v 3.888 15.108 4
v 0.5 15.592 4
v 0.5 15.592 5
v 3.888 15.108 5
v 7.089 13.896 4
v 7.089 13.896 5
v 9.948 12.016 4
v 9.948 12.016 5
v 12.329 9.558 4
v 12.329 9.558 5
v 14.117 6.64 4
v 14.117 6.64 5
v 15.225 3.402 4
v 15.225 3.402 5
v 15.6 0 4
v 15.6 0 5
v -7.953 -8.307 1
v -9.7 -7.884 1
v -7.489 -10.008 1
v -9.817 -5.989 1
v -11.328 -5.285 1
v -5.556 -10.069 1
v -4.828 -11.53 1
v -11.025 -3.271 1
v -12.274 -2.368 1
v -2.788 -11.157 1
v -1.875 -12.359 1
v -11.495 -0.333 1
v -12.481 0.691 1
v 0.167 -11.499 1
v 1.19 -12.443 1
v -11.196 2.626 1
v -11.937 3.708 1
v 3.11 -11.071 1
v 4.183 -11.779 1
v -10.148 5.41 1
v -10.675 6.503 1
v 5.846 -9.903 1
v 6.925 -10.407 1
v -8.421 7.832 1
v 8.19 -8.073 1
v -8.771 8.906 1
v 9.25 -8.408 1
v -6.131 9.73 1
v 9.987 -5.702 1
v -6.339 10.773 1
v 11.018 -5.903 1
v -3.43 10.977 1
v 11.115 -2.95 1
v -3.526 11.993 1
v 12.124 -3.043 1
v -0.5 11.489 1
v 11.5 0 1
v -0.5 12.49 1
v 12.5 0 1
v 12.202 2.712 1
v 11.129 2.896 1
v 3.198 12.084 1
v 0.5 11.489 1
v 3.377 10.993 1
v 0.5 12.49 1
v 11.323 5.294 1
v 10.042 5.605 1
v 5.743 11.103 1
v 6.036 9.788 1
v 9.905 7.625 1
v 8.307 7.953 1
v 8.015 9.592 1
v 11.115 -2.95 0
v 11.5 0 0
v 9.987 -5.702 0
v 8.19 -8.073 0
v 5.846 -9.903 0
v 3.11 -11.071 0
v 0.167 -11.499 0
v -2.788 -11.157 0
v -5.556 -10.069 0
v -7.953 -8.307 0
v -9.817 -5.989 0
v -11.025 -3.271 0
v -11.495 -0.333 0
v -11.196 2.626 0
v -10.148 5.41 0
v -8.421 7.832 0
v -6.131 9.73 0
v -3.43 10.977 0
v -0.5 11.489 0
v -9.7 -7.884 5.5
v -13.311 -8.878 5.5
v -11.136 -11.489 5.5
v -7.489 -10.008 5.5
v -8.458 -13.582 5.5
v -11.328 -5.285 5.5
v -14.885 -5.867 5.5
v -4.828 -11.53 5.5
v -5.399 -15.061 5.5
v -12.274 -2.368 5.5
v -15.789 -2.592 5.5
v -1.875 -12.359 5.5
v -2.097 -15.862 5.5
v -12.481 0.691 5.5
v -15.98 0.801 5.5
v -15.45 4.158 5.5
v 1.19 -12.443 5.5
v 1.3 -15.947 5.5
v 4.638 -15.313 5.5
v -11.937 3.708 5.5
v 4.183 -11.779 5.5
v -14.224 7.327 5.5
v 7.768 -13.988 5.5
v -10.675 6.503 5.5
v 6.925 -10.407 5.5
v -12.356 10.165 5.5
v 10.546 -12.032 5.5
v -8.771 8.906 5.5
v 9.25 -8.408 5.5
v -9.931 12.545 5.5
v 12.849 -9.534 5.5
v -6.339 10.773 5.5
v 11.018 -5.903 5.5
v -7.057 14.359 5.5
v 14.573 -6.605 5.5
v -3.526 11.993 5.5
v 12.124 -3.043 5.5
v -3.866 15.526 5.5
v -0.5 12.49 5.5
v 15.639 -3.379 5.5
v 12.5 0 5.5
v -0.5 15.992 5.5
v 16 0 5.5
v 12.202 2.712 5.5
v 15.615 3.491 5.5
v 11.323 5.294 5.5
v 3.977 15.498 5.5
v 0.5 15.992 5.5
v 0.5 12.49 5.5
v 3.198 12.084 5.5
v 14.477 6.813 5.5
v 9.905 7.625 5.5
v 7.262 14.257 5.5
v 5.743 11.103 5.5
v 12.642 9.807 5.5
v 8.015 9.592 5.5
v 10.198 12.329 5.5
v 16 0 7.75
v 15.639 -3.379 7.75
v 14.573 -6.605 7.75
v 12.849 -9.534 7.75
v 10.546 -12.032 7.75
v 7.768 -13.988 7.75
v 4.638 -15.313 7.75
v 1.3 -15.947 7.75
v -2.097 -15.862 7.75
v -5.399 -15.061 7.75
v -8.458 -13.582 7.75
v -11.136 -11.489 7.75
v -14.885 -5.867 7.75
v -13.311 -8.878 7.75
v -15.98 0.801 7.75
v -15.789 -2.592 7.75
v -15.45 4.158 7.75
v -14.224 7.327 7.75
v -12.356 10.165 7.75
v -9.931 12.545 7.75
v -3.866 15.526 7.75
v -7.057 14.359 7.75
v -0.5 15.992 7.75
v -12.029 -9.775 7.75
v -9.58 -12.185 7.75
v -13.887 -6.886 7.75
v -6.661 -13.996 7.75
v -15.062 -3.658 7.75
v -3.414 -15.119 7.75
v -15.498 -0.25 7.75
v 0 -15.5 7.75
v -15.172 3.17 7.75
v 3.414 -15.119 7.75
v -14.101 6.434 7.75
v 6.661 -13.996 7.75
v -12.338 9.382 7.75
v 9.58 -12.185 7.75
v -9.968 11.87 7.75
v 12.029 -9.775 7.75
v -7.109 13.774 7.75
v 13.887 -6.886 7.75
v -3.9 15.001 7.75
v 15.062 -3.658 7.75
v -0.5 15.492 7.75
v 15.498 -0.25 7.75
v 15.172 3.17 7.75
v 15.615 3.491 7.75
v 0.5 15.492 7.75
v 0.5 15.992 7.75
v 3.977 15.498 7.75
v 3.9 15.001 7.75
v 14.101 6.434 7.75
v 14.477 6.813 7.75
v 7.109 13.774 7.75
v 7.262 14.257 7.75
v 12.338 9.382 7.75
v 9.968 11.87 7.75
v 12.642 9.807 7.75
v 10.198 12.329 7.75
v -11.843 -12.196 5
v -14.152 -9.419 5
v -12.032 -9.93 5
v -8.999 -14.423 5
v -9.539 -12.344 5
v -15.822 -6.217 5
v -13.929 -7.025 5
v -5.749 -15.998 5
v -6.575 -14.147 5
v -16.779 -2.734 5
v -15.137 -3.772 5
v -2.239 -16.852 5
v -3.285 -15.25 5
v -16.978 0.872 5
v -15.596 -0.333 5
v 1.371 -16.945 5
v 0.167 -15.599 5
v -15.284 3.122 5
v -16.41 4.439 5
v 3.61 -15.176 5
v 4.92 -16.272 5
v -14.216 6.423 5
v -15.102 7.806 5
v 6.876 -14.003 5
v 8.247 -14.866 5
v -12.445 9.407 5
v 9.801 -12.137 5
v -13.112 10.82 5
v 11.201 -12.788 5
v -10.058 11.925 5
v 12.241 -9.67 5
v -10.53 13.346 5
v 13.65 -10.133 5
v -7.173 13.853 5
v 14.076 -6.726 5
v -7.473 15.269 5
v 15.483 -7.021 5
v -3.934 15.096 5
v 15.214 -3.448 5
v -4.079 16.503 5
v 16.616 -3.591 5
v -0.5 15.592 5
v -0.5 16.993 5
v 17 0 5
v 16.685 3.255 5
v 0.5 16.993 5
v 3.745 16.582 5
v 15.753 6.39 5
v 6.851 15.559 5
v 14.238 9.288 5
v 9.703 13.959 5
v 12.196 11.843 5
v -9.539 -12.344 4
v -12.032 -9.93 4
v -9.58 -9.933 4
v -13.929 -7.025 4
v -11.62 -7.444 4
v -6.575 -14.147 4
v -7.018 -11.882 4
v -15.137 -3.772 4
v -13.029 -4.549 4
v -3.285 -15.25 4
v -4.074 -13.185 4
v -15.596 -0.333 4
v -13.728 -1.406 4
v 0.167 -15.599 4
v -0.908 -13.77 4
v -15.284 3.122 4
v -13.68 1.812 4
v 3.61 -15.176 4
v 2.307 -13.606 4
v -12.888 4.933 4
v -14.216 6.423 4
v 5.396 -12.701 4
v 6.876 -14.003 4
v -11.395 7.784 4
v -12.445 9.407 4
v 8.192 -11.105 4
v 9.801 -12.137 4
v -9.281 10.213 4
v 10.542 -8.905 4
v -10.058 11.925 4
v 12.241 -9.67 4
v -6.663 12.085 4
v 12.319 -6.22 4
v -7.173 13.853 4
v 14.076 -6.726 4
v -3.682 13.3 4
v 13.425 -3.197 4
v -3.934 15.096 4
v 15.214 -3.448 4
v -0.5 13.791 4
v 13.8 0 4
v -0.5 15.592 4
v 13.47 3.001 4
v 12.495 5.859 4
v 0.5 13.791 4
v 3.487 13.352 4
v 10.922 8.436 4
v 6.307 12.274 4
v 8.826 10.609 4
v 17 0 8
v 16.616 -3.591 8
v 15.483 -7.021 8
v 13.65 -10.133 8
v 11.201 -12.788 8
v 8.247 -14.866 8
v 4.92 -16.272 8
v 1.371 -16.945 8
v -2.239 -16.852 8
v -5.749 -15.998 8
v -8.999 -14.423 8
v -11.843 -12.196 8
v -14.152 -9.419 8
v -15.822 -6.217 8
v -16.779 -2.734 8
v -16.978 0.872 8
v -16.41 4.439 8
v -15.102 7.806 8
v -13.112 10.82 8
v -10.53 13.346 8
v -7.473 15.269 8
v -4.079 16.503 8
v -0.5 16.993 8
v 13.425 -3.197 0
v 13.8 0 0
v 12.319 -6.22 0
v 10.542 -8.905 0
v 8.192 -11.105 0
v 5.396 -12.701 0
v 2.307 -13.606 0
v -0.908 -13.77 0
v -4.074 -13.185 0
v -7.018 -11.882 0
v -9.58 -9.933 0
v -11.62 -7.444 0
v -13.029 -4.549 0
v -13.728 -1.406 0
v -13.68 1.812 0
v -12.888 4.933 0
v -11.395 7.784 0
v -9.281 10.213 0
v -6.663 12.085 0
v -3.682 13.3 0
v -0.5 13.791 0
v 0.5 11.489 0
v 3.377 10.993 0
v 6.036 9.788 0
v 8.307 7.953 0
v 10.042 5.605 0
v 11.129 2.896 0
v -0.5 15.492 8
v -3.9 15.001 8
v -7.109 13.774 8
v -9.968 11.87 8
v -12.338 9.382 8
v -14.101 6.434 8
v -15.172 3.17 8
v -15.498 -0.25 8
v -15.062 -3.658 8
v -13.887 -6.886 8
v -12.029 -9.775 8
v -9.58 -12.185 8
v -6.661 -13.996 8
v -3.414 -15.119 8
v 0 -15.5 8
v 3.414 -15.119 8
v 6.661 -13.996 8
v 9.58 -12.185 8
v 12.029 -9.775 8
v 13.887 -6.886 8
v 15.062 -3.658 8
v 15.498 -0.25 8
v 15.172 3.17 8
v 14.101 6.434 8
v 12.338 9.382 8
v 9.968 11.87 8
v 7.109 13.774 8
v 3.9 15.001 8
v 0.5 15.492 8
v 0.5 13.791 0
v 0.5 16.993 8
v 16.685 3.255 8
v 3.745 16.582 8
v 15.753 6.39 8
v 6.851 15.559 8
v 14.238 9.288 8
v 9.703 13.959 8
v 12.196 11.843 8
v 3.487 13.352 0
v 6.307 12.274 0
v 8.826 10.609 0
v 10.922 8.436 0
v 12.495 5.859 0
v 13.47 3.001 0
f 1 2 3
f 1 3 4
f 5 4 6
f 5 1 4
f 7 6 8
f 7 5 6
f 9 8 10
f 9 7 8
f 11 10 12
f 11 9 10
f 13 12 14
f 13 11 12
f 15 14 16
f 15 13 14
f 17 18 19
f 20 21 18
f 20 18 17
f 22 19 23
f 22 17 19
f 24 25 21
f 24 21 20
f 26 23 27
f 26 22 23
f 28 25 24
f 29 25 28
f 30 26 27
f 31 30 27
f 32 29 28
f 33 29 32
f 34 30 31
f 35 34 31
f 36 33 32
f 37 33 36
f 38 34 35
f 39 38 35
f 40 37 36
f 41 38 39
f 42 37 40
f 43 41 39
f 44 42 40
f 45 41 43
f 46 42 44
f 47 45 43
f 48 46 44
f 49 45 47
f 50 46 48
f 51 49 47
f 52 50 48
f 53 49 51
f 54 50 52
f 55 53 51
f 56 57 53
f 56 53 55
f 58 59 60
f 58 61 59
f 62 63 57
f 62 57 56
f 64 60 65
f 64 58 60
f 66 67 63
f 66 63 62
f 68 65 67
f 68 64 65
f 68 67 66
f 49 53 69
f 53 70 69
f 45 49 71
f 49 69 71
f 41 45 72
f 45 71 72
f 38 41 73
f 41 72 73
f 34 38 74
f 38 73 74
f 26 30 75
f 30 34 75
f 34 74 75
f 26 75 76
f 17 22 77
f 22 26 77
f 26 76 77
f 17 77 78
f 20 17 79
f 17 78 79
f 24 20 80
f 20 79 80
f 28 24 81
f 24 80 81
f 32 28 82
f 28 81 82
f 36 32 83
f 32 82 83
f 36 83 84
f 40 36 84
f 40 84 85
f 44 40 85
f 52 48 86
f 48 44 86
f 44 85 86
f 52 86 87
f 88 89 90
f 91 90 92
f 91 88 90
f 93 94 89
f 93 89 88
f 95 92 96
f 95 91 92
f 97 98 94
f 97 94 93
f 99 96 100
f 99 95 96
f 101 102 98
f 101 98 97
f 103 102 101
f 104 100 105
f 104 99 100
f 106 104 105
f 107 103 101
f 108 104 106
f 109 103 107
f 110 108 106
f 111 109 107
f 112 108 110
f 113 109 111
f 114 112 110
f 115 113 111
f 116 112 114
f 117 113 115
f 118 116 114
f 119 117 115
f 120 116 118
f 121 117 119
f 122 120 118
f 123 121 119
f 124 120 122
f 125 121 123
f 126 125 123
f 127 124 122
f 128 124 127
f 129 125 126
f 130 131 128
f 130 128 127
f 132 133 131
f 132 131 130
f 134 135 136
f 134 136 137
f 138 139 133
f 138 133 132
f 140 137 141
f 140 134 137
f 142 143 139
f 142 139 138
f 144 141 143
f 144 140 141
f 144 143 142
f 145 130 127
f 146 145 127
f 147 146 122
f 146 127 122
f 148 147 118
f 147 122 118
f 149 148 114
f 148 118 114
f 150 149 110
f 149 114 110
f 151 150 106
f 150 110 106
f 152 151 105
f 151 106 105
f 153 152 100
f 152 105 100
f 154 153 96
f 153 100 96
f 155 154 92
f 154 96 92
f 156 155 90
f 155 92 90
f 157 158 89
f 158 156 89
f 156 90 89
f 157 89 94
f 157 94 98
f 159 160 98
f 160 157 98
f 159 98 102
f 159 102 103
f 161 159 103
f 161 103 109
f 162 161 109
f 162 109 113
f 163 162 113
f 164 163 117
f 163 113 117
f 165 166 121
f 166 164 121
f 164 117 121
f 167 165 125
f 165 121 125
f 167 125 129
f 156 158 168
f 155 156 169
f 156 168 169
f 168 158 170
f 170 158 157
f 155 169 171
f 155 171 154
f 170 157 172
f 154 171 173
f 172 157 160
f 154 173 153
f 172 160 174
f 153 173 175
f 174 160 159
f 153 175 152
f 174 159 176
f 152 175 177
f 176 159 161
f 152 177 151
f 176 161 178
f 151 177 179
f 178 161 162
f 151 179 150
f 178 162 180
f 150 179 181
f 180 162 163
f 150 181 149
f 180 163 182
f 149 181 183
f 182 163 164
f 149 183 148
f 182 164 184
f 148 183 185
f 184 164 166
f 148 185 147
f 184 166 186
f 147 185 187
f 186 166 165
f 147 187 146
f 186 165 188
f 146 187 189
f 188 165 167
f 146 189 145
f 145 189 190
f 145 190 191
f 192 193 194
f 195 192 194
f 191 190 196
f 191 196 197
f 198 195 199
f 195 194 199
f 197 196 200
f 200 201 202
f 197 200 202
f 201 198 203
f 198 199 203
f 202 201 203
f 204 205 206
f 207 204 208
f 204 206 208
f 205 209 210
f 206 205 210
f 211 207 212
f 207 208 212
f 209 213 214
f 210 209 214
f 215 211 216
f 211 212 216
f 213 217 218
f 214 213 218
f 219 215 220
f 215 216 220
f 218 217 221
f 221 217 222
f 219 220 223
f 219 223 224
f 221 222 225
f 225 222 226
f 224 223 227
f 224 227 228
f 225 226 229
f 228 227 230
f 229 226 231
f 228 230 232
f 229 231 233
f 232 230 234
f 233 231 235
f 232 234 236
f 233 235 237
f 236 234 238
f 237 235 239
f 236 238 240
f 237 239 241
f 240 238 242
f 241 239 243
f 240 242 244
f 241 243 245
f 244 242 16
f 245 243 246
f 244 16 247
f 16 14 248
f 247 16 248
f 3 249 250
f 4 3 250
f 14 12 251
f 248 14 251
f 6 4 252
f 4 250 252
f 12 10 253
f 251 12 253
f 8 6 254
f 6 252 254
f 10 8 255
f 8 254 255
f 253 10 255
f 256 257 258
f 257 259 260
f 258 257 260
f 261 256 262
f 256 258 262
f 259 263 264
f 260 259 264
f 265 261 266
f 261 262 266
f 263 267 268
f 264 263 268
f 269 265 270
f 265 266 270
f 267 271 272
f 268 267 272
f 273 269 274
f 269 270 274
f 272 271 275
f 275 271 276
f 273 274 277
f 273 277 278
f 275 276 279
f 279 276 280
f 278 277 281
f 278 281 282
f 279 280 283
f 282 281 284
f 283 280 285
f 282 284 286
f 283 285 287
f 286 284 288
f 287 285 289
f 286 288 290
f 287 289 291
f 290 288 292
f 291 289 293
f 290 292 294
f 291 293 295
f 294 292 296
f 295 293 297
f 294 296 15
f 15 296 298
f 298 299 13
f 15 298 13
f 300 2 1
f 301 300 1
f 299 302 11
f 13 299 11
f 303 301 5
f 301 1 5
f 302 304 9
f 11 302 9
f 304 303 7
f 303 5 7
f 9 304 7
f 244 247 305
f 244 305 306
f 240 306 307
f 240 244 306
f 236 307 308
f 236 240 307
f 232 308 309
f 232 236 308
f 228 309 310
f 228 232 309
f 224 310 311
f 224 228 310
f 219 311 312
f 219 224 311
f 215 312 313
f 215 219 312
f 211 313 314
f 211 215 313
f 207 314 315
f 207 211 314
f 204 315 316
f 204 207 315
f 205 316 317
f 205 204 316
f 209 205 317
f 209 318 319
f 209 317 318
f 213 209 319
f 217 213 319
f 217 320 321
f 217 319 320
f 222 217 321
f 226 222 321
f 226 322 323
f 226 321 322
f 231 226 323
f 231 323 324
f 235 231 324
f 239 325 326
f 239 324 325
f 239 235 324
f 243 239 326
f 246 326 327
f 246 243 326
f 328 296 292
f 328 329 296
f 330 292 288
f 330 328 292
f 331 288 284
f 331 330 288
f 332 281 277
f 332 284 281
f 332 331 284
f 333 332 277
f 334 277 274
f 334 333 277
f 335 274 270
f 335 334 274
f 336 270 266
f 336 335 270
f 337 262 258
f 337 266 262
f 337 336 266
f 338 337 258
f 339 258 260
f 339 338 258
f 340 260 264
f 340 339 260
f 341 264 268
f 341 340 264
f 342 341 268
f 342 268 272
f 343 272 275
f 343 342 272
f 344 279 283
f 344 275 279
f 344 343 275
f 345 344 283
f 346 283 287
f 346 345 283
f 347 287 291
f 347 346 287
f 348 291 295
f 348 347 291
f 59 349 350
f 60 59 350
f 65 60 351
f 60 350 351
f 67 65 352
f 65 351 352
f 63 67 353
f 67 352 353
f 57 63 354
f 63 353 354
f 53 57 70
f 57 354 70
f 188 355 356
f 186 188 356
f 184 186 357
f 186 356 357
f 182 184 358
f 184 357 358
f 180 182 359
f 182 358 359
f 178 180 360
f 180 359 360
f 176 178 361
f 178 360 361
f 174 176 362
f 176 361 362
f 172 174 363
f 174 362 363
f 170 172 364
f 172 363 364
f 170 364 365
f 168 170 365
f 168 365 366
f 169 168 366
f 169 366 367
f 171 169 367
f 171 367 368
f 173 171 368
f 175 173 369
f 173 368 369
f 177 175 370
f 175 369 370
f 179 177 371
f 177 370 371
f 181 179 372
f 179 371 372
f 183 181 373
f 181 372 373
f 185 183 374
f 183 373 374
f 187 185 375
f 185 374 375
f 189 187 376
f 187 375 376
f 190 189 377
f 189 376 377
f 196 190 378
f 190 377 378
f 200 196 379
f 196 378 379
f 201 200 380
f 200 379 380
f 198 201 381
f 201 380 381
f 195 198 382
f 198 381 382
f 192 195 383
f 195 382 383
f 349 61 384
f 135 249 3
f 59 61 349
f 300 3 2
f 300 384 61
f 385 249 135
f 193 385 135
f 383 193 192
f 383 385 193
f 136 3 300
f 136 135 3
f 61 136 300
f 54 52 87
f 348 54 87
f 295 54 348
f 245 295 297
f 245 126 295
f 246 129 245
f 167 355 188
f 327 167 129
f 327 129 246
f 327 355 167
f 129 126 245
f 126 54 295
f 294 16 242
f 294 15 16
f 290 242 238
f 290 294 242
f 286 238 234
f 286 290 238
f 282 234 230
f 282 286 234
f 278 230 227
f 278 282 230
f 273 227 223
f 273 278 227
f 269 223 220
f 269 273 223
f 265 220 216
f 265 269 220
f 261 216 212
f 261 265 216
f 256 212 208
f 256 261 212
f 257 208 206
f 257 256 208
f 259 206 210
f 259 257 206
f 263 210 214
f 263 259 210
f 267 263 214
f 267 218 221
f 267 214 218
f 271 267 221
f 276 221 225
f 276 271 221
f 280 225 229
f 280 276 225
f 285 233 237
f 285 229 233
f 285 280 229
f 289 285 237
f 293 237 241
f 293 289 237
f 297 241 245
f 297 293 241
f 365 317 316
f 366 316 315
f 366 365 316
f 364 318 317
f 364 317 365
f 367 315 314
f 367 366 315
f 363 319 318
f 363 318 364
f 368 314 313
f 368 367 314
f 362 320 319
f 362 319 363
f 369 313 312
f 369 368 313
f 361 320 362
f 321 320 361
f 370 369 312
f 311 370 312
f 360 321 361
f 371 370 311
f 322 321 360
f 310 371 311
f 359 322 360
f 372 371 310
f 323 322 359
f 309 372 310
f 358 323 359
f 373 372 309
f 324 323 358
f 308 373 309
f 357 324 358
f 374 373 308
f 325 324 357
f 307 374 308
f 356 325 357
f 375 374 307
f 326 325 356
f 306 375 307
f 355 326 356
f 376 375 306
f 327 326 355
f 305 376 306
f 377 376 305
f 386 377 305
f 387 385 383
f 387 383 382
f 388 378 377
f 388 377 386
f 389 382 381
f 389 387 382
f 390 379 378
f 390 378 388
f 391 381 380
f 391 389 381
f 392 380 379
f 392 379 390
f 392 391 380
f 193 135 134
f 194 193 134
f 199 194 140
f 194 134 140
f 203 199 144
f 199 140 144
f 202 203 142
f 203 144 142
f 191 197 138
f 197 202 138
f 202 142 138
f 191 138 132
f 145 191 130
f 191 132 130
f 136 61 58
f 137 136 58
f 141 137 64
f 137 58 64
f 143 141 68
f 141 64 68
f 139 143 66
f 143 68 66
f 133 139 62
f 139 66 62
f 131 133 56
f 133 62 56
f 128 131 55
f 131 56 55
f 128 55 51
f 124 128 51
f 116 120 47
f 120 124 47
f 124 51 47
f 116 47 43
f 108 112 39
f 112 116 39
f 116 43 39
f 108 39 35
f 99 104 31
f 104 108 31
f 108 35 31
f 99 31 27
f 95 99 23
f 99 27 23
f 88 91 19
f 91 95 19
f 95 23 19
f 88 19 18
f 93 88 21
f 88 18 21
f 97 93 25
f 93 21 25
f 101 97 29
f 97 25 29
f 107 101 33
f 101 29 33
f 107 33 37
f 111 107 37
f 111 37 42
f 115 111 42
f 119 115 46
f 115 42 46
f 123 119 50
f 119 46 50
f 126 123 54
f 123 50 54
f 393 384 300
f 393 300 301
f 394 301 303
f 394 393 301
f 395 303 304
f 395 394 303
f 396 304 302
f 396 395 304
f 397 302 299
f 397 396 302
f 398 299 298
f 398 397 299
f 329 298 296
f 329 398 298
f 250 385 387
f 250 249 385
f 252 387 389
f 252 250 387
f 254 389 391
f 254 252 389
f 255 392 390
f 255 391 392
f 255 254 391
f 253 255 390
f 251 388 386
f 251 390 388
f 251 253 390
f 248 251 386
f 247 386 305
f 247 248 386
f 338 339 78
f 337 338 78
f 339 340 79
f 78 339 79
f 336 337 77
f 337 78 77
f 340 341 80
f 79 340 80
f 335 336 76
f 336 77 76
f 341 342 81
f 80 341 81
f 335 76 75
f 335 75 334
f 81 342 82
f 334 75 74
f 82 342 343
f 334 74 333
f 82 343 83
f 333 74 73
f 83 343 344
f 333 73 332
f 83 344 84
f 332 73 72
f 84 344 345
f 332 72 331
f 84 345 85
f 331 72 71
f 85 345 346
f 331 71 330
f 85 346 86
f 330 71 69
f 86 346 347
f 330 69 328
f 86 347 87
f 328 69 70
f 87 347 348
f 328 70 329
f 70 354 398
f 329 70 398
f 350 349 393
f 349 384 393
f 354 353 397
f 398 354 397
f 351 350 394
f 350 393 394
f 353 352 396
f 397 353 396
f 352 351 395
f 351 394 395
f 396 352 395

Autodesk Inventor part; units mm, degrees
ref_plane "YZ Plane" through (0, 0, 0) normal (1, 0, 0) x (0, 1, 0)
ref_plane "XZ Plane" through (0, 0, 0) normal (0, 1, 0) x (-1, 0, 0)
ref_plane "XY Plane" through (0, 0, 0) normal (0, 0, 1) x (1, 0, 0)
sketch "Sketch1" plane through (0, 0, 0) normal (0, 0, 1) x (1, 0, 0)
  circle A0 centre (0, 0) radius 13.8
  circle A1 centre (0, 0) radius 11.5
  circle A2 centre (0, 0) radius 15.6
  circle A3 centre (0, 0) radius 12.5
  dimension "d0" = 27.6
  dimension "d1" = 23
  dimension "d2" = 31.2
  dimension "d3" = 25
extrude "Extrusion1" add sketch "Sketch1" along normal blind 1 contours A3
extrude "Extrusion2" add sketch "Sketch1" along normal blind 4 contours A0
sketch "Sketch2" plane through (0, 0, 4) normal (0, 0, 1) x (1, 0, 0)
  circle A0 centre (0, 0) radius 15.6 projected
  circle A1 centre (0, 0) radius 12.5 projected
extrude "Extrusion3" add sketch "Sketch2" along normal blind 1
sketch "Sketch4" plane through (0, 0, 5) normal (0, 0, 1) x (1, 0, 0)
  circle A0 centre (0, 0) radius 16
  circle A1 centre (0, 0) radius 17
  circle A2 centre (0, 0) radius 12.5 projected
  dimension "d14" = 32
  dimension "d15" = 34
extrude "Extrusion5" add sketch "Sketch4" along normal blind 0.5 contours A0
extrude "Extrusion6" add sketch "Sketch4" along normal blind 3 contours A1
sketch "Sketch5" plane through (0, 0, 8) normal (0, 0, 1) x (1, 0, 0)
  circle A0 centre (0, 0) radius 16 projected
  circle A1 centre (0, 0) radius 15.5
  dimension "d20" = 31
extrude "Extrusion7" add sketch "Sketch5" against normal blind 0.25
sketch "Sketch8" plane through (0, 0, 8) normal (0, 0, 1) x (1, 0, 0)
  line L0 (0.5, 10) -> (-0.5, 10)
  line L1 (-0.5, 10) -> (-0.5, 20)
  line L2 (-0.5, 20) -> (0.5, 20)
  line L3 (0.5, 20) -> (0.5, 10)
  circle A0 centre (0, 0) radius 15 projected
  line L4 (0.5, 10) -> (-0.5, 20) construction
  line L5 (-0.5, 10) -> (0.5, 20) construction
  point P0 (0, 15)
  dimension "d30" = 1
  dimension "d31" = 10
extrude "Extrusion10" cut sketch "Sketch8" against normal blind 10 contours L0 L1 A0 L3 | A0 L1 L2 L3 picked at (-0.0556, 11.6664)
properties part number "32to25mmFilterAdapter"
